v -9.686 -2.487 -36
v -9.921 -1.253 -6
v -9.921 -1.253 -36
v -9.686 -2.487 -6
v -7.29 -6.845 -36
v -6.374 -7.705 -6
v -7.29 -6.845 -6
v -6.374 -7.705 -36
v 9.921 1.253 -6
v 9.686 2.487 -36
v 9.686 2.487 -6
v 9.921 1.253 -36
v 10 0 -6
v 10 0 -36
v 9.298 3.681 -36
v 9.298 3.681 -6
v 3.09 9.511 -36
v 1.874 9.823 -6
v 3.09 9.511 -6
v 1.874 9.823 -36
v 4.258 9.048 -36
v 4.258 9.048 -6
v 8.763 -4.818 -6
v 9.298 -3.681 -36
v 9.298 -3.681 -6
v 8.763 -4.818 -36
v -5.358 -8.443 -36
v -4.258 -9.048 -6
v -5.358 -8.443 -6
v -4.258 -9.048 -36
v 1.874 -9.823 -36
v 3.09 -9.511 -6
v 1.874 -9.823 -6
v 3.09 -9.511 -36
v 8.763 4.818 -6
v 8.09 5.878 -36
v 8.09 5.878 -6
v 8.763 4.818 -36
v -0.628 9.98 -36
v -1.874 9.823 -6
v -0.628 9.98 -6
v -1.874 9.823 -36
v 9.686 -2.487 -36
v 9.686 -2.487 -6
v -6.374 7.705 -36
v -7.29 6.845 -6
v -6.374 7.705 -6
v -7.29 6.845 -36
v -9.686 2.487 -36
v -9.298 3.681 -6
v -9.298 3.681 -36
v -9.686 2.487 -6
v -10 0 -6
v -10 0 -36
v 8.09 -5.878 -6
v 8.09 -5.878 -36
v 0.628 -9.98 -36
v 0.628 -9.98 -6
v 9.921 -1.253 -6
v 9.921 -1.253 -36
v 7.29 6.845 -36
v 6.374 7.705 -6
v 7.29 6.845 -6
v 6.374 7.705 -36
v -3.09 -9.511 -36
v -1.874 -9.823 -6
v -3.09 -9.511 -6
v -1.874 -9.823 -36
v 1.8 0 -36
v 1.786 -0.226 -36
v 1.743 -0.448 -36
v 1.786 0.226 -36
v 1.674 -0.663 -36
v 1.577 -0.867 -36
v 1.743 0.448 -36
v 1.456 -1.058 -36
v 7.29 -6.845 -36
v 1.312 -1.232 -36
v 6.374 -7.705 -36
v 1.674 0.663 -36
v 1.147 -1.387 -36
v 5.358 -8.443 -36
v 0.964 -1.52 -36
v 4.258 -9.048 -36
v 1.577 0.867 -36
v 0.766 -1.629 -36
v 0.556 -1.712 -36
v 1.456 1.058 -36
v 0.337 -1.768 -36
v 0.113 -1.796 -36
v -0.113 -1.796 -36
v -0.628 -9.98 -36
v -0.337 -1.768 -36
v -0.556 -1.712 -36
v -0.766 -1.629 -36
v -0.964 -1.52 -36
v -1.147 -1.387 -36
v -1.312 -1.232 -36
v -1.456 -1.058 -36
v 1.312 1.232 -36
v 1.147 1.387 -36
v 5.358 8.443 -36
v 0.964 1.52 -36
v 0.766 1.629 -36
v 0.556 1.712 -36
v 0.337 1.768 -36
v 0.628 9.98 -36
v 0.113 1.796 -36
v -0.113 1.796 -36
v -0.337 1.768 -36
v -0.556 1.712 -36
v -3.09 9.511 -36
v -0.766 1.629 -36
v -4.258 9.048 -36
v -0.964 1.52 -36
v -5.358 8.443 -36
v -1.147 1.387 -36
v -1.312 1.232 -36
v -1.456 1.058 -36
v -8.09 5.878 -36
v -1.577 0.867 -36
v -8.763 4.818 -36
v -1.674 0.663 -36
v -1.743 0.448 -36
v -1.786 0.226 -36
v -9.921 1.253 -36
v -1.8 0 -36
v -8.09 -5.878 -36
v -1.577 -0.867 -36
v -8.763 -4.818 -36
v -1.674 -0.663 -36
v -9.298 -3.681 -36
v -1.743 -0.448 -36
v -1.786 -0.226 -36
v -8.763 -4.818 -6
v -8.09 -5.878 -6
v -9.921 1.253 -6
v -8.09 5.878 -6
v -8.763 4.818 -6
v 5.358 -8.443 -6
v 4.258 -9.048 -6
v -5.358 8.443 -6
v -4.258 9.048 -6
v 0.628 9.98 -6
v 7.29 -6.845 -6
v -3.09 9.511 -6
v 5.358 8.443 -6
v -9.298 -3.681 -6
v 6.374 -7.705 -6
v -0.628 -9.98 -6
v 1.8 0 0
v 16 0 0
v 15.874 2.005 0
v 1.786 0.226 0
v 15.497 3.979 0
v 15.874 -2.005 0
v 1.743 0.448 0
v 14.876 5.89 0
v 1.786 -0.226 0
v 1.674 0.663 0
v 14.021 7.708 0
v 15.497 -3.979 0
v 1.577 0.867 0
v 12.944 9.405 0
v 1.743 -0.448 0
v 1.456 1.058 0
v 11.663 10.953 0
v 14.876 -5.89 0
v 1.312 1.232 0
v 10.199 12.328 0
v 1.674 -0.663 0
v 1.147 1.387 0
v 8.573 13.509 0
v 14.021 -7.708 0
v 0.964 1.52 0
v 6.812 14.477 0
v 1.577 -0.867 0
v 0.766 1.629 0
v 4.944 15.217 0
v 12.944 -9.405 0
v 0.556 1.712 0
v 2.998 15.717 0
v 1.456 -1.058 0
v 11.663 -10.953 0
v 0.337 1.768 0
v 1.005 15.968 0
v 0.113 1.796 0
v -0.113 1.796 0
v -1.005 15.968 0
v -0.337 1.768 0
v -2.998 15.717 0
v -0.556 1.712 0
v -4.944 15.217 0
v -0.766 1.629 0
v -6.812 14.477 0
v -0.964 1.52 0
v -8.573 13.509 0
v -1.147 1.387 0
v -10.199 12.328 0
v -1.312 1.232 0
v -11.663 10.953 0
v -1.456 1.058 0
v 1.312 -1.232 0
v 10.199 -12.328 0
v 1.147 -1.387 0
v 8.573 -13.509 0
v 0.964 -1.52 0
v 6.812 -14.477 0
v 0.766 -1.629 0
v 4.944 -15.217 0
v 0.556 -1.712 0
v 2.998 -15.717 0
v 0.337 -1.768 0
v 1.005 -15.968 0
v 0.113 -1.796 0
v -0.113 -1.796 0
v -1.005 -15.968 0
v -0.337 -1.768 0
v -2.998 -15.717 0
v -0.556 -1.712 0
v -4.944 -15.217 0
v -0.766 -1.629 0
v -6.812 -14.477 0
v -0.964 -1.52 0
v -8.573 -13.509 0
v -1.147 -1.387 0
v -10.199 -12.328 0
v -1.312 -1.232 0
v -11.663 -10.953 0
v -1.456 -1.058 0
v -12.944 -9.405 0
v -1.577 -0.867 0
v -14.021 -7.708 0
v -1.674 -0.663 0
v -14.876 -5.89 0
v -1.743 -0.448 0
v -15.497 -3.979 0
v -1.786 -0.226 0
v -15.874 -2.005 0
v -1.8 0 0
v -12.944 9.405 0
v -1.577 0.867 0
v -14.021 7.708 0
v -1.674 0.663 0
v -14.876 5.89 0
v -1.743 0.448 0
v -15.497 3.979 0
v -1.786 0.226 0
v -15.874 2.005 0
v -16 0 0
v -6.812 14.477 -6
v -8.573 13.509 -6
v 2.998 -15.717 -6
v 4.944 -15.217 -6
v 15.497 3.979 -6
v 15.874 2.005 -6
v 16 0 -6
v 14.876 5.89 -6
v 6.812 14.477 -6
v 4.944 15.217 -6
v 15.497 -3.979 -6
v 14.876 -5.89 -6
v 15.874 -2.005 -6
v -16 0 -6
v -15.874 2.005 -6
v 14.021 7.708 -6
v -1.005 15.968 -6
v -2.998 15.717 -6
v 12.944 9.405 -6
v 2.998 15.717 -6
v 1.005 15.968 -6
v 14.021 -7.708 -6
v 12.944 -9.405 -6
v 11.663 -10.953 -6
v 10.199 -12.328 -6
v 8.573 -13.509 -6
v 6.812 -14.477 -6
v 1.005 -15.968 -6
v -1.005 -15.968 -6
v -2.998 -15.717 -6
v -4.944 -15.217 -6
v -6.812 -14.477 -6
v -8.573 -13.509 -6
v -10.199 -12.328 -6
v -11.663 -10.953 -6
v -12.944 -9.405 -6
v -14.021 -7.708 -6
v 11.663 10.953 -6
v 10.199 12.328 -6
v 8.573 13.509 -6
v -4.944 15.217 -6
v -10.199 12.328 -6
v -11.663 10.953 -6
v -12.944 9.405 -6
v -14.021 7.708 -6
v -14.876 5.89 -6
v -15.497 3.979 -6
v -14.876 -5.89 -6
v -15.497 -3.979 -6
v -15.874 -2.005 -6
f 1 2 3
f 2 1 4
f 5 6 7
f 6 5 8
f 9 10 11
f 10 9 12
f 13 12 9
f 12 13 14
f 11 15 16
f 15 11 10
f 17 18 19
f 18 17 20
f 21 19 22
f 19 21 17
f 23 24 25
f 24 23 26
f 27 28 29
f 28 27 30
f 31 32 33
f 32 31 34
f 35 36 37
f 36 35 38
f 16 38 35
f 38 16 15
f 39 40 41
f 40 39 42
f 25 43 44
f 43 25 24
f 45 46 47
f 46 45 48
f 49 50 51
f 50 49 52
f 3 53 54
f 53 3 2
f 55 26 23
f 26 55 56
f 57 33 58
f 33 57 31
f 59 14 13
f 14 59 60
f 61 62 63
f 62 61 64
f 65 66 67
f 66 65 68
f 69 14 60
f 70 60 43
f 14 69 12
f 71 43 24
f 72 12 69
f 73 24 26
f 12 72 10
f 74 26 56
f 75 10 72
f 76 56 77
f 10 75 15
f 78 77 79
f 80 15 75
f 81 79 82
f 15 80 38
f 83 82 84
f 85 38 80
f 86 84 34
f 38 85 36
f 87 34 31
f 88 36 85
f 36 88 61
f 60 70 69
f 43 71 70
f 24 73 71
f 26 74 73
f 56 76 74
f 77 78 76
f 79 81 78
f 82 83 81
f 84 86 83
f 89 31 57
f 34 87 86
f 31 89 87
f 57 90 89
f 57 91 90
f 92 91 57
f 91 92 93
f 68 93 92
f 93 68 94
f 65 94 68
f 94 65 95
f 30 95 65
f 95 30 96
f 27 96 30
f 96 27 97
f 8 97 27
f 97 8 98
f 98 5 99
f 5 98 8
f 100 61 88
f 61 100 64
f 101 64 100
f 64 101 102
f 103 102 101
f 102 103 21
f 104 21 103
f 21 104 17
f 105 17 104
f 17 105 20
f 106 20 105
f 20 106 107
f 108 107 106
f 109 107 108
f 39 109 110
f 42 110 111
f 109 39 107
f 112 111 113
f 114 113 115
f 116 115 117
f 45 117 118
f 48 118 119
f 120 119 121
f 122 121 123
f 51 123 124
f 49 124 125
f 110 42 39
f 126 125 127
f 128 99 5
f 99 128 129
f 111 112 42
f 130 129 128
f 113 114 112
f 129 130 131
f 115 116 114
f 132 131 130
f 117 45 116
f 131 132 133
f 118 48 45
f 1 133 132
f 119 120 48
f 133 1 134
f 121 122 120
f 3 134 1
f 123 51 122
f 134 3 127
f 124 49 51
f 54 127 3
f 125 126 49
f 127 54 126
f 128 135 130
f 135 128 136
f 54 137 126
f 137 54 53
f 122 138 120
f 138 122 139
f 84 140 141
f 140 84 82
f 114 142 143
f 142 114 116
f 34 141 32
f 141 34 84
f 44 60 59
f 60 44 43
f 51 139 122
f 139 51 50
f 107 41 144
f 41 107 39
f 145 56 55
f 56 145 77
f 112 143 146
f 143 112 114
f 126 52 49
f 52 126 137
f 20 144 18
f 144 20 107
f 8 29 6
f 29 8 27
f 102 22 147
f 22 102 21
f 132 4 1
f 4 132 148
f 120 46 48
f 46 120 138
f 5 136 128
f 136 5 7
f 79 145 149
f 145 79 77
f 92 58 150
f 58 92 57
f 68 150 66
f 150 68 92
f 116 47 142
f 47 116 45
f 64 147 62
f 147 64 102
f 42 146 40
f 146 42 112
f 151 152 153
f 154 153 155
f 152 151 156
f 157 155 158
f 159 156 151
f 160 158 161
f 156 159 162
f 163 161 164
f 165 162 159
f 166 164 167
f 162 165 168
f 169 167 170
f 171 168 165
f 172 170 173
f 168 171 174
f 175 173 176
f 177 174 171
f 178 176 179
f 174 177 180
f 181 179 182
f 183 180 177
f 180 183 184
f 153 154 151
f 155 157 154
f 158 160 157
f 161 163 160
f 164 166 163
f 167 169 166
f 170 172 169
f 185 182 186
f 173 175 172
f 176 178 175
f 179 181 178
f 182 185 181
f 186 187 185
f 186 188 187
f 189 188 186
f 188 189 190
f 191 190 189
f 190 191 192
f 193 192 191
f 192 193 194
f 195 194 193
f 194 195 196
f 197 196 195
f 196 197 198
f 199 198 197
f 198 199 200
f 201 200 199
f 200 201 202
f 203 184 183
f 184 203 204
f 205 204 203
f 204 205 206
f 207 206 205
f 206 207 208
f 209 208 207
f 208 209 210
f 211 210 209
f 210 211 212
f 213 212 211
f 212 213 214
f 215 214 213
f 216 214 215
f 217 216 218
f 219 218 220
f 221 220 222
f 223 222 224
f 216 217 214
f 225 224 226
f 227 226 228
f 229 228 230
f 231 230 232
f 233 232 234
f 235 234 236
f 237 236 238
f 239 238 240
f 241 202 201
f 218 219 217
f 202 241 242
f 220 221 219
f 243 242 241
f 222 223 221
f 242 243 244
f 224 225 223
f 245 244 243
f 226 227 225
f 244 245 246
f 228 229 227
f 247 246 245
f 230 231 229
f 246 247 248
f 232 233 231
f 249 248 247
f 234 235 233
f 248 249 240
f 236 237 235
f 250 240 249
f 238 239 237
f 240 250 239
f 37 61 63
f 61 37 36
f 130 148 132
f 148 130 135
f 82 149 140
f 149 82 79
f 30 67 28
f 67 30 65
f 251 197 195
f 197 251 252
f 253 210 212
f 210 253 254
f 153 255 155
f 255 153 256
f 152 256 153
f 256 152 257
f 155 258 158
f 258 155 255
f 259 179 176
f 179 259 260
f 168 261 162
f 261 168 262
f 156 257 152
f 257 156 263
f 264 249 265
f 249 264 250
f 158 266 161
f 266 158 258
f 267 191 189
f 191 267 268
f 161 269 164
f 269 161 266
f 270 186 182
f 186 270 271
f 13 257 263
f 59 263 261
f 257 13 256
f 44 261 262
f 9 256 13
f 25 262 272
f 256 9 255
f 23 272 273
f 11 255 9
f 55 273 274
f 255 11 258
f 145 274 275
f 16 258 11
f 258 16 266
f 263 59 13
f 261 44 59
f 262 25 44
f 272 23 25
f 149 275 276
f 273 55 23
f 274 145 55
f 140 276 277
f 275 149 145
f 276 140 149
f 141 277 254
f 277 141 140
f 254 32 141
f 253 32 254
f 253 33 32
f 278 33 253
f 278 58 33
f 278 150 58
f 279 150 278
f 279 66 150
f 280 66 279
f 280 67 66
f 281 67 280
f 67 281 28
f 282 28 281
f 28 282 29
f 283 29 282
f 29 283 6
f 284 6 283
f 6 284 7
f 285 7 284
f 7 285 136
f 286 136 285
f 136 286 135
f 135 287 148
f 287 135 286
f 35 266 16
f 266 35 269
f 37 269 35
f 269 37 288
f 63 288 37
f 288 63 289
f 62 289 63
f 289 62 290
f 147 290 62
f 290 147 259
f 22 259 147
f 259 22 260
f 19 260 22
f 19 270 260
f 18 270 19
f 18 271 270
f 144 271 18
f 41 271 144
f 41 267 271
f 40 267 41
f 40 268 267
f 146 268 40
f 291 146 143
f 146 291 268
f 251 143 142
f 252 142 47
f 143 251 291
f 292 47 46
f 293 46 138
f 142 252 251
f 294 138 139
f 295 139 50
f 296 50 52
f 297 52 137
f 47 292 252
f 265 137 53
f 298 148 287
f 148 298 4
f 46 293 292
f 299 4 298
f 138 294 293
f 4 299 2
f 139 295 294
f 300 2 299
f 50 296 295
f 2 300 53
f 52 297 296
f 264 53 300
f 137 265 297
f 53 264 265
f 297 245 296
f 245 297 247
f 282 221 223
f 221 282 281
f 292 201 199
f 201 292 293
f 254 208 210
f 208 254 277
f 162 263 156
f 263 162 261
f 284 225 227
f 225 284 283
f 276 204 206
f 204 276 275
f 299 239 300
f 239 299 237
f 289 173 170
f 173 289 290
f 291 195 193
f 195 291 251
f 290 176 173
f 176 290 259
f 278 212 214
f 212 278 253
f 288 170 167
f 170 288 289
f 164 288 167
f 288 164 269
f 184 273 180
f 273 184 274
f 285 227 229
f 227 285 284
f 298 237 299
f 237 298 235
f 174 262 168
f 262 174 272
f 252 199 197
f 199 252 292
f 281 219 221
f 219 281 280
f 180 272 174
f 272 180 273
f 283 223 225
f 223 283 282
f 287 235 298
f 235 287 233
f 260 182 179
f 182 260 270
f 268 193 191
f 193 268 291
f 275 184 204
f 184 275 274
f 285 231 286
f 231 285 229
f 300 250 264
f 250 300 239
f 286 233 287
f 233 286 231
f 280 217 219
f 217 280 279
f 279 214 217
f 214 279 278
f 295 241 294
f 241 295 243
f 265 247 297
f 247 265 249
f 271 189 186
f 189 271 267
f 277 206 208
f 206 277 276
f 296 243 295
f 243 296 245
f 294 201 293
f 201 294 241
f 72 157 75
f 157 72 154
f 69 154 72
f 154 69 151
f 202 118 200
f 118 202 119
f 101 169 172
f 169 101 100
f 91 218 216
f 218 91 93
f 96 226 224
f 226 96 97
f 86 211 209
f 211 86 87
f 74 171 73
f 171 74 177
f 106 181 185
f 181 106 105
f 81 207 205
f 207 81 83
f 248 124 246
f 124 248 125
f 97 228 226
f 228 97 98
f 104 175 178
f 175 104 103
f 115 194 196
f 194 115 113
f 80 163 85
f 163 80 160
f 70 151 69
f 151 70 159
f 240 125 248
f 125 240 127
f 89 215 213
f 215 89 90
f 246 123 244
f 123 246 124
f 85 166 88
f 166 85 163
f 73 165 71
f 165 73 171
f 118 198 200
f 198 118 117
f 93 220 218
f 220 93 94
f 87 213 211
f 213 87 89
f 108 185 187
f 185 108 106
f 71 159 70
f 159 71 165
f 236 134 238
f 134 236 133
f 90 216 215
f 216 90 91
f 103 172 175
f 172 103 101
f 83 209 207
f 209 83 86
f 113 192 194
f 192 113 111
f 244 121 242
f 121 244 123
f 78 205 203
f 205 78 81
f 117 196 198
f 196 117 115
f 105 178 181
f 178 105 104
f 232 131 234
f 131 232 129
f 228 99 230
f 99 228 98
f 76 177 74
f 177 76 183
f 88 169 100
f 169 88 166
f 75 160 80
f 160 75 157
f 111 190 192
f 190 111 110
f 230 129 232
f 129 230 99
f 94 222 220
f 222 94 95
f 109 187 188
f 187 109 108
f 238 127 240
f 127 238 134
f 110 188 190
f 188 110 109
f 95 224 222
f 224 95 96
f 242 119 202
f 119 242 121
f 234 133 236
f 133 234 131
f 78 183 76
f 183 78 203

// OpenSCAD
$fn = 50;


difference() {
	union() {
		translate(v = [0, 0, -36.0000000000]) {
			cylinder(h = 36, r = 10.0000000000);
		}
		translate(v = [0, 0, -6.0000000000]) {
			cylinder(h = 6, r = 16.0000000000);
		}
	}
	union() {
		#translate(v = [0, 0, -36]) {
			cylinder(h = 36, r = 1.8000000000);
		}
	}
}
